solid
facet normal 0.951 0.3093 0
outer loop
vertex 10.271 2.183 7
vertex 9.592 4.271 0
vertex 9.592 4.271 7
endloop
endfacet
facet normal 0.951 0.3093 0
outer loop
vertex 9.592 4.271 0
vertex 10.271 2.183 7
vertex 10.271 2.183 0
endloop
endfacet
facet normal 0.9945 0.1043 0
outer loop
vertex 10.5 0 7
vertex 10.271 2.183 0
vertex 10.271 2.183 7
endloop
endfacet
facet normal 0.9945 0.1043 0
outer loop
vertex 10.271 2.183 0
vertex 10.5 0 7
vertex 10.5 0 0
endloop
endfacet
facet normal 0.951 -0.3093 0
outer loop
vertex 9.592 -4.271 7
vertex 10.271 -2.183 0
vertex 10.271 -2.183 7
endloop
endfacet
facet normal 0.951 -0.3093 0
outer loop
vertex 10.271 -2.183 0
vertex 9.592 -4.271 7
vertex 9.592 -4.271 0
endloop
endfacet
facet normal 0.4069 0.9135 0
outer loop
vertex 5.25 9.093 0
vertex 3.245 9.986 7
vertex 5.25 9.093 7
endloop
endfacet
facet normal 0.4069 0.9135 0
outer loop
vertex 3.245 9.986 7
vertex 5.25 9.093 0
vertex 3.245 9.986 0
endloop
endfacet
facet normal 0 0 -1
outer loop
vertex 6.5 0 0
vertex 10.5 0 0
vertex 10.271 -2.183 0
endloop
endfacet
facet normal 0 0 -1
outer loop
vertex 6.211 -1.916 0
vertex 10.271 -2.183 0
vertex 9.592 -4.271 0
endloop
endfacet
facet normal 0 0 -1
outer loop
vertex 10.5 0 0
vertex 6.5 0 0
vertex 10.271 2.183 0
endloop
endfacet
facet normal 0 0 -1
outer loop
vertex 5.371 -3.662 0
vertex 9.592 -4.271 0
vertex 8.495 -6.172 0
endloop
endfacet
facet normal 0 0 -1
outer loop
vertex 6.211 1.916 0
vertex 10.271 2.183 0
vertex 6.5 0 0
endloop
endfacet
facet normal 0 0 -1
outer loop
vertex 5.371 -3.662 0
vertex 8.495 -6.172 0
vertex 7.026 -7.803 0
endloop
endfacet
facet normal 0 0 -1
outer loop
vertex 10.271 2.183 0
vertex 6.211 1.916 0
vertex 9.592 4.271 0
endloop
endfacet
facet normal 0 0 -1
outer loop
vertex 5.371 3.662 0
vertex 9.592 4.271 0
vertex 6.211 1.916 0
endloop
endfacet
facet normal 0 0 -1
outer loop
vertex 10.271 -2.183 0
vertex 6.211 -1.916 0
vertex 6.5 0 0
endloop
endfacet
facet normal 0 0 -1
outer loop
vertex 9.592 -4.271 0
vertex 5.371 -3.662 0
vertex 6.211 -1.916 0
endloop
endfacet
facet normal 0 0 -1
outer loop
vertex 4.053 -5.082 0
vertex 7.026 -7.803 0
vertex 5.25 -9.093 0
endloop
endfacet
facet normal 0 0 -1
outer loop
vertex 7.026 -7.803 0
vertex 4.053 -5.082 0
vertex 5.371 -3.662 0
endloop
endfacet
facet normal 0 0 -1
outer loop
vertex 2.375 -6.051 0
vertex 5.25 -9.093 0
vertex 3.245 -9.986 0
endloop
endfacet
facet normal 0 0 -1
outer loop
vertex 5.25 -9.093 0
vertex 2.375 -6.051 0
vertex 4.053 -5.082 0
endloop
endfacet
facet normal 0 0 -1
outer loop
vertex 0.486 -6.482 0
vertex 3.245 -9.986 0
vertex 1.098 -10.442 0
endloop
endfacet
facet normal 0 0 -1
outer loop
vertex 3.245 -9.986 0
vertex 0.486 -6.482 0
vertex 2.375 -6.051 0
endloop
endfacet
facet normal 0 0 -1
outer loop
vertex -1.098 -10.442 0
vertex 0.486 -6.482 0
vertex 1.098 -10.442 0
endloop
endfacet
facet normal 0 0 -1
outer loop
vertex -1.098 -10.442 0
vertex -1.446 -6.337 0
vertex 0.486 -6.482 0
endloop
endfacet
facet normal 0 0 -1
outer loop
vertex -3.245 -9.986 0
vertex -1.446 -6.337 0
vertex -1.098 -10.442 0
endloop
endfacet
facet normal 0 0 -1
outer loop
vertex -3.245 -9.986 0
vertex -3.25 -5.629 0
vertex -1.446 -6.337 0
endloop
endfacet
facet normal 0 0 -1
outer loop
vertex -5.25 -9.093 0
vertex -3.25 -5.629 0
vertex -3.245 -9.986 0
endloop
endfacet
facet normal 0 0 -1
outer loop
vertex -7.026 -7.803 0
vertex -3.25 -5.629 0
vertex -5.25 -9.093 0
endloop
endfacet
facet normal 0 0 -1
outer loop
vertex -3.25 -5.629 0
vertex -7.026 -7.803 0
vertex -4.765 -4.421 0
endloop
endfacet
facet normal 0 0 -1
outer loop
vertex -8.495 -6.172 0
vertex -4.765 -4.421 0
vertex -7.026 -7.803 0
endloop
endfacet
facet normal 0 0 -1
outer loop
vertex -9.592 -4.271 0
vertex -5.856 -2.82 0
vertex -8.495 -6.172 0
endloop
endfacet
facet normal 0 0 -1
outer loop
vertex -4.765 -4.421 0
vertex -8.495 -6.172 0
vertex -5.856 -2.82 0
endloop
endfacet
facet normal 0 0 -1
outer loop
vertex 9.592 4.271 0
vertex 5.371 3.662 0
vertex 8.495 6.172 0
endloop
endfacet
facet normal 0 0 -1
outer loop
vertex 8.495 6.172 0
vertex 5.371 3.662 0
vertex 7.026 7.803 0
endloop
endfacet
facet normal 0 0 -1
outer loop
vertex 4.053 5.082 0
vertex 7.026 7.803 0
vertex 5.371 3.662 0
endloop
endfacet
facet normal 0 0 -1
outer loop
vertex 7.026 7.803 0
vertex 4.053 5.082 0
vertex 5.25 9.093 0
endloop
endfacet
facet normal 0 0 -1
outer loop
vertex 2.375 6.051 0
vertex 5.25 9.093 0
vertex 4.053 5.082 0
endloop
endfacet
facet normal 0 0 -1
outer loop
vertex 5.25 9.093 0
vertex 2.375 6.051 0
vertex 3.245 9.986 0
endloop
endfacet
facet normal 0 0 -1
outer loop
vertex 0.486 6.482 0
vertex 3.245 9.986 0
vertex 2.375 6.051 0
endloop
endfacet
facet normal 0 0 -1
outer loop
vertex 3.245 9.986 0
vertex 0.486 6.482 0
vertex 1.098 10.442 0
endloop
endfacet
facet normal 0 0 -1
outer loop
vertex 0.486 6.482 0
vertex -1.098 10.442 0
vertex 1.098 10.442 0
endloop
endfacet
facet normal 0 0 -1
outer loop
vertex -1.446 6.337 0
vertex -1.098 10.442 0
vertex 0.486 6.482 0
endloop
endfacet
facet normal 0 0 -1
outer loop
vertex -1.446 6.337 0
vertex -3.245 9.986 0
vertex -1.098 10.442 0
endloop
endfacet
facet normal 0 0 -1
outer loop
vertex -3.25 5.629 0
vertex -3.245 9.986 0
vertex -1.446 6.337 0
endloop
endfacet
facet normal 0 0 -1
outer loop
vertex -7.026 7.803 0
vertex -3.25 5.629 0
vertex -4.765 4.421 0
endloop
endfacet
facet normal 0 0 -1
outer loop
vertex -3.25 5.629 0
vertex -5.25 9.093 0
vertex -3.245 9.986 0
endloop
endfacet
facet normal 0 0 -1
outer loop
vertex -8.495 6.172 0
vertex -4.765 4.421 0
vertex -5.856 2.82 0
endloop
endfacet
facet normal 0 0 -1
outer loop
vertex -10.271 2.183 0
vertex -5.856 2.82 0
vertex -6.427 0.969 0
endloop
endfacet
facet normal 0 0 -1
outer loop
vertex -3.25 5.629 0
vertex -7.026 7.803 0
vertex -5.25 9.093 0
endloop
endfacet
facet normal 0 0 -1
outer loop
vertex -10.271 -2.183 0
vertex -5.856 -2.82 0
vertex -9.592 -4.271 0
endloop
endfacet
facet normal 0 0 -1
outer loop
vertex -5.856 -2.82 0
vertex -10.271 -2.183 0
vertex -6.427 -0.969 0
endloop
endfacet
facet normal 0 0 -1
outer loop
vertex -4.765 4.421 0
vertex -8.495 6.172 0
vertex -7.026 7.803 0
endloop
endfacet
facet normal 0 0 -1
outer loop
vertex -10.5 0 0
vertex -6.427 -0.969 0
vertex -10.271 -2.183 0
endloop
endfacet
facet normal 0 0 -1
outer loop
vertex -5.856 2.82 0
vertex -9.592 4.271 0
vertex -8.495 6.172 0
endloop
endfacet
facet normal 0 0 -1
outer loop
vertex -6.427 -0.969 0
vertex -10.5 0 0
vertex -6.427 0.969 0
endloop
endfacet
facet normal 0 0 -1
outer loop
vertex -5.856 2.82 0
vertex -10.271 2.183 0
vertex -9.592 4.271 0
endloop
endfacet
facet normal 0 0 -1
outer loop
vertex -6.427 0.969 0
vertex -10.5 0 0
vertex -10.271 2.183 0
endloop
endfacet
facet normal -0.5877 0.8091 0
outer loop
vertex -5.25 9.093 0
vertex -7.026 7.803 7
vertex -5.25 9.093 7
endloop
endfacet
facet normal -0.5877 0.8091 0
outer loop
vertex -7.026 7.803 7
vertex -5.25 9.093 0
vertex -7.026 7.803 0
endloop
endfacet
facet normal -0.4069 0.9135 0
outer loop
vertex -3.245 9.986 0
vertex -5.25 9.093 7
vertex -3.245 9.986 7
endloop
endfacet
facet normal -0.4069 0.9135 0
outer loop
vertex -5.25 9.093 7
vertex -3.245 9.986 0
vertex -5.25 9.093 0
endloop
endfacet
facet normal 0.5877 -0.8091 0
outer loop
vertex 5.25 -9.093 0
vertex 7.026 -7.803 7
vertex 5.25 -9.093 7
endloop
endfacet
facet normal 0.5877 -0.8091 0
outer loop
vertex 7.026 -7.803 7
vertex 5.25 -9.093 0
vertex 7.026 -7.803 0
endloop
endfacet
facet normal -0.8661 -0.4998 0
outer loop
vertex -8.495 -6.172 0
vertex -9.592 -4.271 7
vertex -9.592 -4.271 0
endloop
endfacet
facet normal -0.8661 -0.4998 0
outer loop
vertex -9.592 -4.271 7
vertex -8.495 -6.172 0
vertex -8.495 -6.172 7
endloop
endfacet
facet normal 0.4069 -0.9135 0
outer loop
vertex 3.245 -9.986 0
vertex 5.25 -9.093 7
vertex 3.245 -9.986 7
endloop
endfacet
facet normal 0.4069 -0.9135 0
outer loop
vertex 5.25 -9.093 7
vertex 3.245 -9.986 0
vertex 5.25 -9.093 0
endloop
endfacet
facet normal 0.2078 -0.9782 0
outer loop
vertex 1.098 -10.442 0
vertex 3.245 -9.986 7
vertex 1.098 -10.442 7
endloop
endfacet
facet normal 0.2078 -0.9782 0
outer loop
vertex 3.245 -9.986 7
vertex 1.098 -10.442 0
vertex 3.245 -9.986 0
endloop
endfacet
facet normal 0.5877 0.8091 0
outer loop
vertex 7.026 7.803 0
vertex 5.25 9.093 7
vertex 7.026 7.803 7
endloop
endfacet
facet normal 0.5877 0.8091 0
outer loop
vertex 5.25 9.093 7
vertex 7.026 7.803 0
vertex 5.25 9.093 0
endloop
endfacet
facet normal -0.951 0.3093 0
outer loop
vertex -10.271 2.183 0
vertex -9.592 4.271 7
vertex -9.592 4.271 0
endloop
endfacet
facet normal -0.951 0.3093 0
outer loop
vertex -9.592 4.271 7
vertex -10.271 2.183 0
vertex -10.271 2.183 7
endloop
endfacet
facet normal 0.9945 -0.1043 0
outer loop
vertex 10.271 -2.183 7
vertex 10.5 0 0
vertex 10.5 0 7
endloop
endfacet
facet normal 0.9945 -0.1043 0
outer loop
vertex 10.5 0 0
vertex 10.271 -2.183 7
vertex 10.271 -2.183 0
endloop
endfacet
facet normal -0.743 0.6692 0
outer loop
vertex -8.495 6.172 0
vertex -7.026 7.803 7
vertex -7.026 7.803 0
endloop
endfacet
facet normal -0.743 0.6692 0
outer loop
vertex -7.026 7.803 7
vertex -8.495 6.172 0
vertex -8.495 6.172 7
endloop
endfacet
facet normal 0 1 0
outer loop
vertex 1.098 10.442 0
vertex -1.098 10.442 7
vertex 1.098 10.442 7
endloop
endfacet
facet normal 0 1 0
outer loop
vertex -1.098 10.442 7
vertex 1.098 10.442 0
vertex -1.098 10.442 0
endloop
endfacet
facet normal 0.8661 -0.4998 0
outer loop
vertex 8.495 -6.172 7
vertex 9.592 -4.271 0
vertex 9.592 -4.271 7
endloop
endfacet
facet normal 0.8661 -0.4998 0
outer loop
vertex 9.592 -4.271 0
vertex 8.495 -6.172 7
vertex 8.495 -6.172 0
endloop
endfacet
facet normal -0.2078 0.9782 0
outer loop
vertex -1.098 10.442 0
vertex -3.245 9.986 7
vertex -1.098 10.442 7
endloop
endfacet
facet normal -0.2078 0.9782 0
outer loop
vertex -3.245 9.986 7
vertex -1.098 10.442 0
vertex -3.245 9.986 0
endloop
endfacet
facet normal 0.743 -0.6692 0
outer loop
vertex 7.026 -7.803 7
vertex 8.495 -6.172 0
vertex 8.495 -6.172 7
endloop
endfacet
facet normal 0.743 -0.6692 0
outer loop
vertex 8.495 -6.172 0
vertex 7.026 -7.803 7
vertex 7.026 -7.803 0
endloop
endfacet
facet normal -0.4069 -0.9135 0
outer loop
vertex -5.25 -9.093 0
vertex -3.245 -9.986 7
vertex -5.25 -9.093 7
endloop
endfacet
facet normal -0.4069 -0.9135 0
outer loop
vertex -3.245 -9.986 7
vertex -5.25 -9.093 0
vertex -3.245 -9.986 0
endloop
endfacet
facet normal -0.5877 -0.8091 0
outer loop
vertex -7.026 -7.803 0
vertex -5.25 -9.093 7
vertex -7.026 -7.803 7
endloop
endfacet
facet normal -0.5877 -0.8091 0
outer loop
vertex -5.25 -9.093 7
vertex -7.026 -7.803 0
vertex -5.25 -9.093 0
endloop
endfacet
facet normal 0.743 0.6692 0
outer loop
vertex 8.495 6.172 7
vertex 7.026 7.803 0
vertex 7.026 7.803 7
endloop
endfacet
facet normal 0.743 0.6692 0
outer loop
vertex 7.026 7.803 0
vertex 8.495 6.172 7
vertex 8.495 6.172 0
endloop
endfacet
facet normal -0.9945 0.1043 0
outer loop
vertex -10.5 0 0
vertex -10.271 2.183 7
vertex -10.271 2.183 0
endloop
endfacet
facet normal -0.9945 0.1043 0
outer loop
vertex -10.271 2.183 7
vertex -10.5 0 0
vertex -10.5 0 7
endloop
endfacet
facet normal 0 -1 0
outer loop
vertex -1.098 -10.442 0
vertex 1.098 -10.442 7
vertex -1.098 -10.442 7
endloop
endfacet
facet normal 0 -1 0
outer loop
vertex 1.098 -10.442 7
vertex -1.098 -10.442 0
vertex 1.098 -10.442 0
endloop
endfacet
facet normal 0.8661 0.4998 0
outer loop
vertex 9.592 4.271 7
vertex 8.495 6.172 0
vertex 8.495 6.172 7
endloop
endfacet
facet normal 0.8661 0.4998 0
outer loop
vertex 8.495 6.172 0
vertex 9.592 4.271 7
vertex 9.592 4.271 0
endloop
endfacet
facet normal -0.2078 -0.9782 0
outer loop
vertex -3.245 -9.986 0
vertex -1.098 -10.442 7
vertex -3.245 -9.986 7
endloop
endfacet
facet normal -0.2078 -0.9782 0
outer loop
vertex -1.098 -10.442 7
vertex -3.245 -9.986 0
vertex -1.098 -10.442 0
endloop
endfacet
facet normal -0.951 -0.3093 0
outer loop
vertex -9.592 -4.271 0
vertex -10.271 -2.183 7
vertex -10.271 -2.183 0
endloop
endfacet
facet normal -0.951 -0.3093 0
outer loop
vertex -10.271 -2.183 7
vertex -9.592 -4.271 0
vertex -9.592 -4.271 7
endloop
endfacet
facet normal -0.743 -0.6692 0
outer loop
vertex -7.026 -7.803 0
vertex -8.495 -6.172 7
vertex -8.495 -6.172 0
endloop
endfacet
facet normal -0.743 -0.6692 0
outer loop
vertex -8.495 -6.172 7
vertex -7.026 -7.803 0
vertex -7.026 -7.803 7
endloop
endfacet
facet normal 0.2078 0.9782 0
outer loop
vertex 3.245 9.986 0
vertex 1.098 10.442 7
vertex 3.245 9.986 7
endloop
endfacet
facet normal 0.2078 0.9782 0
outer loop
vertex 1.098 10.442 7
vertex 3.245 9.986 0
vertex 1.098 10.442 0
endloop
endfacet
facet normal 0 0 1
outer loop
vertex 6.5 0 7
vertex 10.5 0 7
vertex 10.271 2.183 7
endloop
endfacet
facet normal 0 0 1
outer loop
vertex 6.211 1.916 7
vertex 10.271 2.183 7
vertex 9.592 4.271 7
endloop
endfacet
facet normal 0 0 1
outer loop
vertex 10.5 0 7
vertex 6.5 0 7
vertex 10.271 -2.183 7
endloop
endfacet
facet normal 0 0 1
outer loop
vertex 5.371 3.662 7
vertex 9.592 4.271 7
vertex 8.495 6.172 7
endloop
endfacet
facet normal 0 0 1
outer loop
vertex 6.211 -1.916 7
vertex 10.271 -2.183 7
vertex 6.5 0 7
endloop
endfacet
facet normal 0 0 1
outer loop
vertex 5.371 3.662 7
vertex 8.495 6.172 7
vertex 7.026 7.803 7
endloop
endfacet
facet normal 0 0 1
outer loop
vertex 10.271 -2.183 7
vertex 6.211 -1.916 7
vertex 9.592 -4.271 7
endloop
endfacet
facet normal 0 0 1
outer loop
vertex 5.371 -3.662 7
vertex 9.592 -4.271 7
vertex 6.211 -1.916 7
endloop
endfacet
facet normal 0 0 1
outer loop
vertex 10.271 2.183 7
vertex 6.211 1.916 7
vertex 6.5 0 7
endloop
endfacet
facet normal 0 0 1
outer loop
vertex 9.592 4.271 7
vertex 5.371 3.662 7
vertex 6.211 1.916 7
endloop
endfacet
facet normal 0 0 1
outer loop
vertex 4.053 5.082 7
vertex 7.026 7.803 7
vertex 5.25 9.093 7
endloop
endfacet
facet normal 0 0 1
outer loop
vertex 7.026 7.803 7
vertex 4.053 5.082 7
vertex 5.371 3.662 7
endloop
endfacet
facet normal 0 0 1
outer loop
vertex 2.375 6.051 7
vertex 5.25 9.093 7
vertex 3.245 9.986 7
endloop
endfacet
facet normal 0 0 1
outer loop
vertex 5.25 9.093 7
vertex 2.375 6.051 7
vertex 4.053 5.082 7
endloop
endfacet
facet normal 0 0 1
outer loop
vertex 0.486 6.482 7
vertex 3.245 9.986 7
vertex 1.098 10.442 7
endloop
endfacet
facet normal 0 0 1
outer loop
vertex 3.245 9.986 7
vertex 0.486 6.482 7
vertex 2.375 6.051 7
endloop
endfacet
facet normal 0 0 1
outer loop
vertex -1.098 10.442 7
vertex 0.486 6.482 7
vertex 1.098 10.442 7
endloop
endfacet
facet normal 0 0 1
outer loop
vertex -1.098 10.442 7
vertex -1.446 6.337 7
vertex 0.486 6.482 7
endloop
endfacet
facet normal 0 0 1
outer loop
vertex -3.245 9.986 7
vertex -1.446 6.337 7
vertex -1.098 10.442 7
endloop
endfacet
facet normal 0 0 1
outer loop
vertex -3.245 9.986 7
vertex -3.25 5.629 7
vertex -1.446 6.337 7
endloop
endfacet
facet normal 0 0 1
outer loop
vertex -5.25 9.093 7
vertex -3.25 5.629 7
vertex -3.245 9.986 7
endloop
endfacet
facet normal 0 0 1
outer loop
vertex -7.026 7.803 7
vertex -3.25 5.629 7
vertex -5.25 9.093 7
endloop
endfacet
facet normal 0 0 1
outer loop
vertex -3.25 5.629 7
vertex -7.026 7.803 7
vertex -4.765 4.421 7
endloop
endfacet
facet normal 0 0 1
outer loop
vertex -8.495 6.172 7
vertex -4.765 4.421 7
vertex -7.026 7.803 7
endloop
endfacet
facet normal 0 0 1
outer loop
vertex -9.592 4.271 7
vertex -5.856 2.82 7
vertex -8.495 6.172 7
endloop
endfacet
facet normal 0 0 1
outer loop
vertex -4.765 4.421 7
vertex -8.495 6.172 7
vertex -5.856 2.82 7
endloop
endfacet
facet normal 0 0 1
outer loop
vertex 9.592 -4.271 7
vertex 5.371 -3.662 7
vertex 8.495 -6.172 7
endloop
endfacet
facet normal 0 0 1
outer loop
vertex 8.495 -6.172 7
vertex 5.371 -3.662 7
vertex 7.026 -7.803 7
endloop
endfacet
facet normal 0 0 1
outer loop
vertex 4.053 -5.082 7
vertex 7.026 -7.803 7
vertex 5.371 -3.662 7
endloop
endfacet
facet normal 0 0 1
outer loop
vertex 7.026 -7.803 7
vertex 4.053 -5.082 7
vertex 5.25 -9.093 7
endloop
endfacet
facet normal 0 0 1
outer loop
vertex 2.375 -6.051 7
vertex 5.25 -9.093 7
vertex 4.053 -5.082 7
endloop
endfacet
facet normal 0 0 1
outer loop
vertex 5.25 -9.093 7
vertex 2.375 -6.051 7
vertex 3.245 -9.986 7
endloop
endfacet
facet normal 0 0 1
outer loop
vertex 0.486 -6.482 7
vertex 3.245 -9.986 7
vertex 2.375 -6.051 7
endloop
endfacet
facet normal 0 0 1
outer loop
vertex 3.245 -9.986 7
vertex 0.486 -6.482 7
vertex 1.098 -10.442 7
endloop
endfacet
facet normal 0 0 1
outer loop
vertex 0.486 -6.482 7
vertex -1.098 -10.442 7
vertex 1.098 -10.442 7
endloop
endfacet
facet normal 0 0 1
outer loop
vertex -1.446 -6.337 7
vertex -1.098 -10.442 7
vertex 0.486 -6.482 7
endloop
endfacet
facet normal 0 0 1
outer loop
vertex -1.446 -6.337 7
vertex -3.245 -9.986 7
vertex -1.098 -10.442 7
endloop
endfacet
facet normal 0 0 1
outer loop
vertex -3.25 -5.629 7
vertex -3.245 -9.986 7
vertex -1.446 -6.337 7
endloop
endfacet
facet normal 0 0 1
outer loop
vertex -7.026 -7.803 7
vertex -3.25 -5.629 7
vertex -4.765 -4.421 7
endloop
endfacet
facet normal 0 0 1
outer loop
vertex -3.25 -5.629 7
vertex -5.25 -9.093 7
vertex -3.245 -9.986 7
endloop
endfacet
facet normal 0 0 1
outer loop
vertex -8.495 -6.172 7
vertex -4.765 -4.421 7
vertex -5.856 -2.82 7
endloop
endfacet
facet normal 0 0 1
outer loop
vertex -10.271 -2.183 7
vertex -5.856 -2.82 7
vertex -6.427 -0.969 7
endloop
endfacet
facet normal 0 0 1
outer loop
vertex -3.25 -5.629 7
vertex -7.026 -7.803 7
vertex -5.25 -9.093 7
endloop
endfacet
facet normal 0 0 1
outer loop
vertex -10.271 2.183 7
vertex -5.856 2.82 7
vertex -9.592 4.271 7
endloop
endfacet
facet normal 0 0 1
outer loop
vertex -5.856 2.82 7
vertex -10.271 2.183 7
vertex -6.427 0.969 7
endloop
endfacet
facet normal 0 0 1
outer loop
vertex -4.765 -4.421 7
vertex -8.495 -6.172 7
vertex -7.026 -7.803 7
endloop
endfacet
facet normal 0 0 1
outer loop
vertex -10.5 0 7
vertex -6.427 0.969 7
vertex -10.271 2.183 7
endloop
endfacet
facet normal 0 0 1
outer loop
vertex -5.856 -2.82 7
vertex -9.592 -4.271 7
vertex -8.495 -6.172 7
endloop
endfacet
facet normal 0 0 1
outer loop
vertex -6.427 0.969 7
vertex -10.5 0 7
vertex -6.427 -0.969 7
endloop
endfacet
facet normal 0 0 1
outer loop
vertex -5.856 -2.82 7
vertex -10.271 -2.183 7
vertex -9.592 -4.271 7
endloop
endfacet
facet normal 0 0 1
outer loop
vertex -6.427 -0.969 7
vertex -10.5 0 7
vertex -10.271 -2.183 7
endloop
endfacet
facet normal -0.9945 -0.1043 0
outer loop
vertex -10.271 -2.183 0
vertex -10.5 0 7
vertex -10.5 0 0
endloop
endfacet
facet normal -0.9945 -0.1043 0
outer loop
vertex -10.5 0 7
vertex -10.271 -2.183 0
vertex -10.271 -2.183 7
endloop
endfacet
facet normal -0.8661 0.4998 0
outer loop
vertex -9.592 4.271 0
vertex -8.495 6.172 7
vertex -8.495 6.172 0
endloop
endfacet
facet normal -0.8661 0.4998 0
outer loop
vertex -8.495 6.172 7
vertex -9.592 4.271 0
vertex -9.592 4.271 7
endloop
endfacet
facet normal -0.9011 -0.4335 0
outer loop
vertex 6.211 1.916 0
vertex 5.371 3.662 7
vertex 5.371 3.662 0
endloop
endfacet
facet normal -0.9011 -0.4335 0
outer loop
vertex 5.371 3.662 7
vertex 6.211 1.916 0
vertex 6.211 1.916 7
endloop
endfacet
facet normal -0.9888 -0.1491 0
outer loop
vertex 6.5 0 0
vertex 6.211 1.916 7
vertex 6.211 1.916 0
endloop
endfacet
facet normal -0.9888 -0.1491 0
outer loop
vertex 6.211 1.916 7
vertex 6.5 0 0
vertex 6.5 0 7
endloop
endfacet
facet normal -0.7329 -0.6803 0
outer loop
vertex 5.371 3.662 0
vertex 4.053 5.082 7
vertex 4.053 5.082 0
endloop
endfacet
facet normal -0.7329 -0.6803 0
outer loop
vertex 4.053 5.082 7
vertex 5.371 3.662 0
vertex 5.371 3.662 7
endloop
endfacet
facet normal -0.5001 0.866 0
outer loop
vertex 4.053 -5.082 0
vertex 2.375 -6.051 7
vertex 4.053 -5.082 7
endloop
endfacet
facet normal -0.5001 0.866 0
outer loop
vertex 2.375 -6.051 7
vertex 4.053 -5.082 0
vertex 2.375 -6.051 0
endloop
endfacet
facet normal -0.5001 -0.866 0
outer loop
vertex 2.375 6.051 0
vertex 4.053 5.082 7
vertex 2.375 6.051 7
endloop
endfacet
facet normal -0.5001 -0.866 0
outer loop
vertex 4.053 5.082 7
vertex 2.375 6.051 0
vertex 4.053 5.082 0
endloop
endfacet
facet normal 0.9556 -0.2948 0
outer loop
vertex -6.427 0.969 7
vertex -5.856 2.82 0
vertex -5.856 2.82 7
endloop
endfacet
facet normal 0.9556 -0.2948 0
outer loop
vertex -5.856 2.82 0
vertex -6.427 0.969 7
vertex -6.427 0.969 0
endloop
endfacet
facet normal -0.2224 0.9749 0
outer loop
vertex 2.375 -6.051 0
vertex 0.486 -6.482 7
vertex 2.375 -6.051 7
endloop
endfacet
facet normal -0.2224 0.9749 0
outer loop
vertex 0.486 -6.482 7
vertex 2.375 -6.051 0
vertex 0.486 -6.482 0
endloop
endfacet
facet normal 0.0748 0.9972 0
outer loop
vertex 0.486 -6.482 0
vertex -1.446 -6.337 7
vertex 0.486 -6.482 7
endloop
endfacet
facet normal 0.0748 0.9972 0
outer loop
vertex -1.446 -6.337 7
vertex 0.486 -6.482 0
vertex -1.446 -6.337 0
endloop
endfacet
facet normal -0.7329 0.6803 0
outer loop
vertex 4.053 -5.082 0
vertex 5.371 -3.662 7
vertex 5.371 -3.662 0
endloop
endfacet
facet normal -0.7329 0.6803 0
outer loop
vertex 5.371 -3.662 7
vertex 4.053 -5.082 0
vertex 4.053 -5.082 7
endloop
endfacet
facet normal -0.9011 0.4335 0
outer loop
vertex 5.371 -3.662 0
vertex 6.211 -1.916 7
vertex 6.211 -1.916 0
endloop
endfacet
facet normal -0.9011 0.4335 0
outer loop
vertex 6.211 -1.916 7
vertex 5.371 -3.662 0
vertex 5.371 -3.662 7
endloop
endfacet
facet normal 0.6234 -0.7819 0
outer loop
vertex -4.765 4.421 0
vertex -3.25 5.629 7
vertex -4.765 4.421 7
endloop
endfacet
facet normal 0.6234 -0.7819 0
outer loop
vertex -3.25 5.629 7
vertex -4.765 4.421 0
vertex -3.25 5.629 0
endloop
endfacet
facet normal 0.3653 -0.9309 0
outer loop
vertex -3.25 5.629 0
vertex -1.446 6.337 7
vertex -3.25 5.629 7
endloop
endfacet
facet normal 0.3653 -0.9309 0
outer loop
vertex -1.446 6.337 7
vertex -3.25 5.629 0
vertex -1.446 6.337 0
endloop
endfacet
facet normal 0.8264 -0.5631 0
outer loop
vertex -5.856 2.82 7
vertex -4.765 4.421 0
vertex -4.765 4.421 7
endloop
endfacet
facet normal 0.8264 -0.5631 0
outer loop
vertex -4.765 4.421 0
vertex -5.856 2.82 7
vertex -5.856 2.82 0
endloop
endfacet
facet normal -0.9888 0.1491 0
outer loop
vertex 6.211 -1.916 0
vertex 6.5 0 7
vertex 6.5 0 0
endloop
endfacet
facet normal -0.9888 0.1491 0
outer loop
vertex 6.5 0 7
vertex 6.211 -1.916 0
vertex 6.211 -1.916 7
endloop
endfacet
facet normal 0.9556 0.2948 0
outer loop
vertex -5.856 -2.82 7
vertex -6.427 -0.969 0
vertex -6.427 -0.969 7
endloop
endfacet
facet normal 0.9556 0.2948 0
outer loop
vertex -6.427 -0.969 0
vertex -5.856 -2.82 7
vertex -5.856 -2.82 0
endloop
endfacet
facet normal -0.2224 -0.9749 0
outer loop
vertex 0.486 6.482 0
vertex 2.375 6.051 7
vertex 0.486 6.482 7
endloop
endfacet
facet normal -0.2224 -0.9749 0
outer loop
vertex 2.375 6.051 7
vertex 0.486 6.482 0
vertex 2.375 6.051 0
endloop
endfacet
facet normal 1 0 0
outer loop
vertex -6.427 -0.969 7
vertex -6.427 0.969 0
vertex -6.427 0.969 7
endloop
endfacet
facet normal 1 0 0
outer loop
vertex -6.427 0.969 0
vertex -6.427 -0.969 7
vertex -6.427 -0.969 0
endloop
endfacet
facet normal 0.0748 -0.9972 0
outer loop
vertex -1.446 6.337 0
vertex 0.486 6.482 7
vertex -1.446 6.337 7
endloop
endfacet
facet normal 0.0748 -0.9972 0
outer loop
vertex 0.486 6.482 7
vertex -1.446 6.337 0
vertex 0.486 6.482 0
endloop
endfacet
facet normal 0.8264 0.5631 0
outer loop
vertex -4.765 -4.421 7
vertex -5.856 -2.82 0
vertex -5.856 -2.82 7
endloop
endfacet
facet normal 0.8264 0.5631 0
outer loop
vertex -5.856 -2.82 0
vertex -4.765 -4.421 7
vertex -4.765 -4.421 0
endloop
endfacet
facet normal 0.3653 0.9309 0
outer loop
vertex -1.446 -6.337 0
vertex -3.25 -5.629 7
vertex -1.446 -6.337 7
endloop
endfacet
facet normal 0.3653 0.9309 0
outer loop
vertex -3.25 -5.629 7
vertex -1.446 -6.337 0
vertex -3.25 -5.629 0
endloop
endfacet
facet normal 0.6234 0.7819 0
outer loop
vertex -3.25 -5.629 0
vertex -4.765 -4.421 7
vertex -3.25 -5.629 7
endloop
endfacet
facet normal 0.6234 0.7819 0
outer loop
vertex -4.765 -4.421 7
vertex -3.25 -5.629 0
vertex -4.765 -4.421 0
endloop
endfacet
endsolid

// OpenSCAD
// file: configuration.scad
// eMAKEr Huxley
// Configuration file
// GNU GPL v3
// Jean-Marc Giacalone
// info@emakershop.com
// www.emakershop.com
// http://www.reprap.org/wiki/EMAKER_Huxley
// http://github.com/jmgiacalone/eMAKERHuxley

//use <library.scad>

//Round corner diameter
round_corner_diameter = 8;

//Thin wall size
layer_height = 0.4;
perimeter_width_over_thicknes = 1.6;
infill_widht_over_thickness = 1.55;
thin_wall = 2*(perimeter_width_over_thicknes*layer_height+infill_widht_over_thickness*layer_height);
if(thin_wall<2){
	echo("Check thin wall size, its below 2mm!");
}
echo(thin_wall);

// MINI-HUXLEY VERSION (TODO, just place holder)
// include <configuration-huxley.scad>
m8_diameter=8.3;
m5_diameter=5.3;
m4_diameter=4.3;
m3_diameter=3.3;
m3_dia_clr=3.5;
m3_nut = 2.8;
m3_af = 5.8;
m6_diameter = 6;
m6_nut = 11.5;
bushing_diameter = 8;
motor_shaft=5.3;
bushing_rodsize = 6;
bushing_outerDiameter = 12;
bushing_lenght = 8;

// Some basic functions, probably should be somewhere else
// main file
include <configuration.scad>

module IrisHolder() {

    difference() {
        cylinder(h=13.4-6.4,r=10.5);
        translate([0,0,-0.01]) cylinder(h=13.4-6.2,r=6.5);
        // Two holes to mount Iris Holder 
        //rotate(a=[90,0,0]) translate([0,3,6])cylinder(r=m3_diameter/2,h=6);
        //rotate(a=[90,0,0]) translate([0,3,-12])cylinder(r=m3_diameter/2,h=6);
    }
}

IrisHolder();
